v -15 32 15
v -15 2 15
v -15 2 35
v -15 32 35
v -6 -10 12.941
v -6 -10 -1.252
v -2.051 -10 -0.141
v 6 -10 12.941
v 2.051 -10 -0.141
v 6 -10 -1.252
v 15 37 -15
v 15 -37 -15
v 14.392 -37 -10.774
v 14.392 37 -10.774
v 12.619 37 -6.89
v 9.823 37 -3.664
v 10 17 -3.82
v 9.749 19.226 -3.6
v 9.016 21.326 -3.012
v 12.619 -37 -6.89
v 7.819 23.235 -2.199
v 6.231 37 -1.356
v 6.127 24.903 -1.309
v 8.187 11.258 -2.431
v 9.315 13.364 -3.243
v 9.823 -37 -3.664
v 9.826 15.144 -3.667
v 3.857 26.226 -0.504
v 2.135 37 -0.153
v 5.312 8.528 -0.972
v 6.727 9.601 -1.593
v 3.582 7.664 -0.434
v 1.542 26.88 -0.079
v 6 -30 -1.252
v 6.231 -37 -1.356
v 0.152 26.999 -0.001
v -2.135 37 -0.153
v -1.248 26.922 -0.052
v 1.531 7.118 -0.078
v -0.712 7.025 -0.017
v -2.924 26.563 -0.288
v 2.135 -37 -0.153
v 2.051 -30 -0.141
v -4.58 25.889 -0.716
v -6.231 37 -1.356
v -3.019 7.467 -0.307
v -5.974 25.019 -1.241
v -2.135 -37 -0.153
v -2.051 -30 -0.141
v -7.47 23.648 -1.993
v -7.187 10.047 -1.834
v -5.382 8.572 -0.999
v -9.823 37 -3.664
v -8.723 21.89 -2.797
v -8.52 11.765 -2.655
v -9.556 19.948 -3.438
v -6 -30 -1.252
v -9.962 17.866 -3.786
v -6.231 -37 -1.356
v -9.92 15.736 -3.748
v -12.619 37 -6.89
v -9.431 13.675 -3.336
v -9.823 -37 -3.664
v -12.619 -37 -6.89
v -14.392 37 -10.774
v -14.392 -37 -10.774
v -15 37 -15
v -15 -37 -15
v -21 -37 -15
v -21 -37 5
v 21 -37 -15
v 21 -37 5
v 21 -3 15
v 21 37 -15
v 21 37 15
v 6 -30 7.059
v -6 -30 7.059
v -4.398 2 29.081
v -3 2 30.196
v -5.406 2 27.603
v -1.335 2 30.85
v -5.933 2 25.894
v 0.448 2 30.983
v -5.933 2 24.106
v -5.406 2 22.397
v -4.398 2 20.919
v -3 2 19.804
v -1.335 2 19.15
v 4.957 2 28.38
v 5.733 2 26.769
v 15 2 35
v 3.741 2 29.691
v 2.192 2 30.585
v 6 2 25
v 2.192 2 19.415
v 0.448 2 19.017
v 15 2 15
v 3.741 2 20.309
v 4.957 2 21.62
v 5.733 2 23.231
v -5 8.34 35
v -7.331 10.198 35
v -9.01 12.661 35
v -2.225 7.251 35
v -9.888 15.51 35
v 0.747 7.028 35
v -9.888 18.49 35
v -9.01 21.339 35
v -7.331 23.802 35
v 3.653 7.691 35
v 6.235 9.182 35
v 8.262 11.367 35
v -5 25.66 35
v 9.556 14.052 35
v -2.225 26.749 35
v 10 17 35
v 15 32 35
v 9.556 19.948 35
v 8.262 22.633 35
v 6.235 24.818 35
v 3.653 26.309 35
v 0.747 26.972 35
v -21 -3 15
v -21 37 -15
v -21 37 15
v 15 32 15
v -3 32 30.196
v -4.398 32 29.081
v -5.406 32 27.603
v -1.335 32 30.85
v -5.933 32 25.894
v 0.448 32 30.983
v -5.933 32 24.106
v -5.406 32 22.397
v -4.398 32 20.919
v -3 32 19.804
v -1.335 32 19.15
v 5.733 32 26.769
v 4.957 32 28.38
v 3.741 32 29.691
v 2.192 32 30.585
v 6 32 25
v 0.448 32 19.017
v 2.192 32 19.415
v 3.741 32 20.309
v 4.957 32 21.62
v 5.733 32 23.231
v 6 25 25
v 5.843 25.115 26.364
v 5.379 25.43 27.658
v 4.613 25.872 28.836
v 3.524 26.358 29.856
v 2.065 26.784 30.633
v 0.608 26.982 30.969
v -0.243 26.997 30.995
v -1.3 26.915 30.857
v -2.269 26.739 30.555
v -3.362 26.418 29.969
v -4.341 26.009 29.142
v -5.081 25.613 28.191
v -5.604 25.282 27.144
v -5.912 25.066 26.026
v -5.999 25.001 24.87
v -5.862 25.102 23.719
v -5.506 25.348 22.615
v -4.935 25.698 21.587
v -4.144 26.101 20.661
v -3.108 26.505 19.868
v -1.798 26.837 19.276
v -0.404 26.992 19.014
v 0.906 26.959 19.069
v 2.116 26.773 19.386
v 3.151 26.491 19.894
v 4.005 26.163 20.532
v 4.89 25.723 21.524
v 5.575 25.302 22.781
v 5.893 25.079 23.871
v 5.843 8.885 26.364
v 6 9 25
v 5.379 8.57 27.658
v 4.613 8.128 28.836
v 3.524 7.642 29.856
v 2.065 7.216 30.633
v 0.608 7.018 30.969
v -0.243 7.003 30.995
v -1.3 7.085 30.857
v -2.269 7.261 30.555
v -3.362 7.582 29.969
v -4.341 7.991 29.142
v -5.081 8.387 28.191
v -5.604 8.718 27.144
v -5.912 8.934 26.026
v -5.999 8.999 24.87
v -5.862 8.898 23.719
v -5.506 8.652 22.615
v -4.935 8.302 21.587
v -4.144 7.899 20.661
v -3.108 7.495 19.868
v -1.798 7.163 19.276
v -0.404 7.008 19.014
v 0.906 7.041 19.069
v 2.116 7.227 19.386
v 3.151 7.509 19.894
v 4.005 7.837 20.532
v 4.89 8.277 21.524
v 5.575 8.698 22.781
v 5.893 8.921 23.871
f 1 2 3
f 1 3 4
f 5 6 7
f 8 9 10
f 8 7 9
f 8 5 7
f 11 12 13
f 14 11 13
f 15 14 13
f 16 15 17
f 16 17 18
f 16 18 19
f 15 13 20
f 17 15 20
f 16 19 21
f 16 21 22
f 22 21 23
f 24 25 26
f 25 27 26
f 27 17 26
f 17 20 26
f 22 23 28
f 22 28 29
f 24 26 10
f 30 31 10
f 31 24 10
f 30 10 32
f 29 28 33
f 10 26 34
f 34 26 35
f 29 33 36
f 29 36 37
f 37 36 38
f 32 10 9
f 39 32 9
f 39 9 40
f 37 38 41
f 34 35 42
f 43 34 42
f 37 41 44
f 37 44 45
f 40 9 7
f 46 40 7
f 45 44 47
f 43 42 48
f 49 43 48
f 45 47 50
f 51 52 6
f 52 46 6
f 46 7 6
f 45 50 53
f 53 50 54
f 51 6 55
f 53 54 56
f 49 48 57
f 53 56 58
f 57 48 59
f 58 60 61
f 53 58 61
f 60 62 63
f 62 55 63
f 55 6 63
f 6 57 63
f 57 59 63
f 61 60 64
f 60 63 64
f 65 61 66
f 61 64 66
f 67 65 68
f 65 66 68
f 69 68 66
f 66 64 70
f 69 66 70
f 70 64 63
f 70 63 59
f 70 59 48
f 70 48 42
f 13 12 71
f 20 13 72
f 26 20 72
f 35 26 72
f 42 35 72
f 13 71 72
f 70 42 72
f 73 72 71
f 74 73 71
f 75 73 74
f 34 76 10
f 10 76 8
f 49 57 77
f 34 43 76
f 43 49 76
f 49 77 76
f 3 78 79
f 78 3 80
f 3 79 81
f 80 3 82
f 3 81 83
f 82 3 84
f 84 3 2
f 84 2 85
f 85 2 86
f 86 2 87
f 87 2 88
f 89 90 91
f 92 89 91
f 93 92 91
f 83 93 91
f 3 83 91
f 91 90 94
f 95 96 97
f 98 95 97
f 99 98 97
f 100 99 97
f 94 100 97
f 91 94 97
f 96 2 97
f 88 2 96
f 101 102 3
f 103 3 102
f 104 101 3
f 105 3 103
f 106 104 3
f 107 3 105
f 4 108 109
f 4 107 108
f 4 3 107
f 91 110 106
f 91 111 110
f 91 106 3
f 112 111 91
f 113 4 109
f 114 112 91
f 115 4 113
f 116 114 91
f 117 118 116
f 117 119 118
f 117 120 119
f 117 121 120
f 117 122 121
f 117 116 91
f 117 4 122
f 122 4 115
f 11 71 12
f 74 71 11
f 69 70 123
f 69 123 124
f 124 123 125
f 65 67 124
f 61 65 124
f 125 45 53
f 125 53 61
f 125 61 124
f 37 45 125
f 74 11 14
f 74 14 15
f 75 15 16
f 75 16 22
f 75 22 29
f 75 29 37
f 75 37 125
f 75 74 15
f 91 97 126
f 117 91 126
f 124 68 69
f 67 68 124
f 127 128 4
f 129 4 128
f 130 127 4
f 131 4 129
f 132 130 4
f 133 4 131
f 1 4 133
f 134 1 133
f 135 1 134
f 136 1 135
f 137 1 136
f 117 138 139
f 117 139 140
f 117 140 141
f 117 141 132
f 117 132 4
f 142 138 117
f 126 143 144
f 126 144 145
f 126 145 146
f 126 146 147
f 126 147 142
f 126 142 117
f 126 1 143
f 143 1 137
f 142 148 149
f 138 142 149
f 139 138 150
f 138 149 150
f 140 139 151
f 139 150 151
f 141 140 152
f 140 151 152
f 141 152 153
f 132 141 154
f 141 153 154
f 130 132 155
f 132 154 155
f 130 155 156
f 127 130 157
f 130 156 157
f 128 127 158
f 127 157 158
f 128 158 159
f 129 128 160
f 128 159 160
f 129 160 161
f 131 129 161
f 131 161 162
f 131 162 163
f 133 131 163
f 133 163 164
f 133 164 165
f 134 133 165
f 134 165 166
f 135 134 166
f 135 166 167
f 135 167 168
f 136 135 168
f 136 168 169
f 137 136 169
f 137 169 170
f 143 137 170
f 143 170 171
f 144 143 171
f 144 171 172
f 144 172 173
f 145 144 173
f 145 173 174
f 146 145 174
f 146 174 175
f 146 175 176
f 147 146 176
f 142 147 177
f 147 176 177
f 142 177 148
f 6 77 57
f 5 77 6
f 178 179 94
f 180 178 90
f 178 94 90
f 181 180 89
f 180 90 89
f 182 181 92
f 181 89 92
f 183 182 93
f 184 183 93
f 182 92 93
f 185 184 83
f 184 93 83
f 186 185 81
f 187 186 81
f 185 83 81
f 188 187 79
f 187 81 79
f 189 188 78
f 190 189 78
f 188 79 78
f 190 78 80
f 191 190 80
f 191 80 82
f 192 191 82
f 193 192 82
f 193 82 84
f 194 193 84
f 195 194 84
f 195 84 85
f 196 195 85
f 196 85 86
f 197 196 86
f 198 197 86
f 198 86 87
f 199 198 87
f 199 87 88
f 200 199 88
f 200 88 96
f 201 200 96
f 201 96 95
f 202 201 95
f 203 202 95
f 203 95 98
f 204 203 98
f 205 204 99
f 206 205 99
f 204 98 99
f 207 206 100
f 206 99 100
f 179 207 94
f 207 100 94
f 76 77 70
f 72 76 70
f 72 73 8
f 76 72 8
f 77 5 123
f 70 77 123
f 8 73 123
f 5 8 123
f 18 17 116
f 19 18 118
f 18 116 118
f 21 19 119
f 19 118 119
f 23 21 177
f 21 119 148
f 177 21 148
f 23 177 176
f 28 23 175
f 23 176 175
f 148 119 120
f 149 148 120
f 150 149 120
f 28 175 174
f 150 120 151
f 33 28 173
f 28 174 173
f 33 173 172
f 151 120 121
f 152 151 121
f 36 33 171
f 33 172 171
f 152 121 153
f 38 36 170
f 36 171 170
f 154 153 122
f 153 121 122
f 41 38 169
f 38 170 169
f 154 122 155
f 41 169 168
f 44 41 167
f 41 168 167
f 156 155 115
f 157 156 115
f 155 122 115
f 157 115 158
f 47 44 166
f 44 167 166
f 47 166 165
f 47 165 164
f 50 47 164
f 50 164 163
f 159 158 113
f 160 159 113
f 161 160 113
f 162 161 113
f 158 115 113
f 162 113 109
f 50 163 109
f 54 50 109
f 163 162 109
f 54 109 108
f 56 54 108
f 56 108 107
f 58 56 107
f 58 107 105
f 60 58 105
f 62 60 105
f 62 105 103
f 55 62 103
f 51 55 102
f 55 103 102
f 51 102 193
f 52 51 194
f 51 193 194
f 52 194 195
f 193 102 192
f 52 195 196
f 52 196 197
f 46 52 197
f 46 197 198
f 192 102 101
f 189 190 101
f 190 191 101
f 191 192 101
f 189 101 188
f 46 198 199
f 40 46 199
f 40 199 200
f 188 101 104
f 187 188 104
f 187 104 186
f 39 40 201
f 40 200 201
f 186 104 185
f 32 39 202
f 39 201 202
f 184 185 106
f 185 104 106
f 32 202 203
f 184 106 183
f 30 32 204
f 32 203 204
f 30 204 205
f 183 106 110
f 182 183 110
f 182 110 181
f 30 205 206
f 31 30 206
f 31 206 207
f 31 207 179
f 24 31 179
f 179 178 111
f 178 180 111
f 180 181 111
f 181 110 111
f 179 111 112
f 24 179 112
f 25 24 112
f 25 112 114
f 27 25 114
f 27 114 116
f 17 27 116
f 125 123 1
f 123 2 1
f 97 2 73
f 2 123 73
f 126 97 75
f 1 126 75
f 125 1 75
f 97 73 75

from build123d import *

# Parameters (mm, degrees)
F0_W      = 74
F0_H      = 30
F1_DEPTH  = 21
F2_SIZE2  = 34
F2_SIZE   = 10
F3_W      = 30
F3_H      = 30
F4_DEPTH  = 20
F5_R      = 10
F6_DEPTH  = 50.001
F7_R      = 6
F8_DEPTH  = 35.001
F10_W     = 12
F10_H     = 20
F11_DEPTH = 30.0010001
F9_R      = 15
F12_DEPTH = 74.001


with BuildPart() as f1:
    # F0 (on Right) → F1 (new body, symmetric)
    with BuildSketch(Plane.YZ):
        Rectangle(F0_W, F0_H)
    extrude(amount=F1_DEPTH, both=True)

    # F2
    f2_edges = [f1.edges().sort_by_distance(p)[0] for p in [
        (0, -37, 15),
    ]]
    f2_side = f1.faces().sort_by_distance((0, -37, 0))[0]
    chamfer(f2_edges, length=F2_SIZE, length2=F2_SIZE2, reference=f2_side)

    # F3 (on face) → F4 (join)
    with BuildSketch(Plane.XY.offset(15)):
        with Locations((0, 17)):
            Rectangle(F3_W, F3_H)
    extrude(amount=F4_DEPTH)

    # F5 (on face) → F6 (cut, through all)
    with BuildSketch(Plane.XY.offset(35)):
        with Locations((0, 17)):
            Circle(F5_R)
    extrude(amount=-F6_DEPTH, mode=Mode.SUBTRACT)

    # F7 (on face) → F8 (cut, through all)
    with BuildSketch(Plane.XZ.offset(-2)):
        with Locations((0, 25)):
            Circle(F7_R)
    extrude(amount=-F8_DEPTH, mode=Mode.SUBTRACT)

    # F10 (on face) → F11 (cut, through all)
    with BuildSketch(Plane.XY.offset(15)):
        with Locations((0, -20)):
            Rectangle(F10_W, F10_H)
    extrude(amount=-F11_DEPTH, mode=Mode.SUBTRACT)

    # F9 (on face) → F12 (cut, through all)
    with BuildSketch(Plane.XZ.offset(37)):
        with Locations((0, -15)):
            Circle(F9_R)
    extrude(amount=-F12_DEPTH, mode=Mode.SUBTRACT)


solid = f1.part
